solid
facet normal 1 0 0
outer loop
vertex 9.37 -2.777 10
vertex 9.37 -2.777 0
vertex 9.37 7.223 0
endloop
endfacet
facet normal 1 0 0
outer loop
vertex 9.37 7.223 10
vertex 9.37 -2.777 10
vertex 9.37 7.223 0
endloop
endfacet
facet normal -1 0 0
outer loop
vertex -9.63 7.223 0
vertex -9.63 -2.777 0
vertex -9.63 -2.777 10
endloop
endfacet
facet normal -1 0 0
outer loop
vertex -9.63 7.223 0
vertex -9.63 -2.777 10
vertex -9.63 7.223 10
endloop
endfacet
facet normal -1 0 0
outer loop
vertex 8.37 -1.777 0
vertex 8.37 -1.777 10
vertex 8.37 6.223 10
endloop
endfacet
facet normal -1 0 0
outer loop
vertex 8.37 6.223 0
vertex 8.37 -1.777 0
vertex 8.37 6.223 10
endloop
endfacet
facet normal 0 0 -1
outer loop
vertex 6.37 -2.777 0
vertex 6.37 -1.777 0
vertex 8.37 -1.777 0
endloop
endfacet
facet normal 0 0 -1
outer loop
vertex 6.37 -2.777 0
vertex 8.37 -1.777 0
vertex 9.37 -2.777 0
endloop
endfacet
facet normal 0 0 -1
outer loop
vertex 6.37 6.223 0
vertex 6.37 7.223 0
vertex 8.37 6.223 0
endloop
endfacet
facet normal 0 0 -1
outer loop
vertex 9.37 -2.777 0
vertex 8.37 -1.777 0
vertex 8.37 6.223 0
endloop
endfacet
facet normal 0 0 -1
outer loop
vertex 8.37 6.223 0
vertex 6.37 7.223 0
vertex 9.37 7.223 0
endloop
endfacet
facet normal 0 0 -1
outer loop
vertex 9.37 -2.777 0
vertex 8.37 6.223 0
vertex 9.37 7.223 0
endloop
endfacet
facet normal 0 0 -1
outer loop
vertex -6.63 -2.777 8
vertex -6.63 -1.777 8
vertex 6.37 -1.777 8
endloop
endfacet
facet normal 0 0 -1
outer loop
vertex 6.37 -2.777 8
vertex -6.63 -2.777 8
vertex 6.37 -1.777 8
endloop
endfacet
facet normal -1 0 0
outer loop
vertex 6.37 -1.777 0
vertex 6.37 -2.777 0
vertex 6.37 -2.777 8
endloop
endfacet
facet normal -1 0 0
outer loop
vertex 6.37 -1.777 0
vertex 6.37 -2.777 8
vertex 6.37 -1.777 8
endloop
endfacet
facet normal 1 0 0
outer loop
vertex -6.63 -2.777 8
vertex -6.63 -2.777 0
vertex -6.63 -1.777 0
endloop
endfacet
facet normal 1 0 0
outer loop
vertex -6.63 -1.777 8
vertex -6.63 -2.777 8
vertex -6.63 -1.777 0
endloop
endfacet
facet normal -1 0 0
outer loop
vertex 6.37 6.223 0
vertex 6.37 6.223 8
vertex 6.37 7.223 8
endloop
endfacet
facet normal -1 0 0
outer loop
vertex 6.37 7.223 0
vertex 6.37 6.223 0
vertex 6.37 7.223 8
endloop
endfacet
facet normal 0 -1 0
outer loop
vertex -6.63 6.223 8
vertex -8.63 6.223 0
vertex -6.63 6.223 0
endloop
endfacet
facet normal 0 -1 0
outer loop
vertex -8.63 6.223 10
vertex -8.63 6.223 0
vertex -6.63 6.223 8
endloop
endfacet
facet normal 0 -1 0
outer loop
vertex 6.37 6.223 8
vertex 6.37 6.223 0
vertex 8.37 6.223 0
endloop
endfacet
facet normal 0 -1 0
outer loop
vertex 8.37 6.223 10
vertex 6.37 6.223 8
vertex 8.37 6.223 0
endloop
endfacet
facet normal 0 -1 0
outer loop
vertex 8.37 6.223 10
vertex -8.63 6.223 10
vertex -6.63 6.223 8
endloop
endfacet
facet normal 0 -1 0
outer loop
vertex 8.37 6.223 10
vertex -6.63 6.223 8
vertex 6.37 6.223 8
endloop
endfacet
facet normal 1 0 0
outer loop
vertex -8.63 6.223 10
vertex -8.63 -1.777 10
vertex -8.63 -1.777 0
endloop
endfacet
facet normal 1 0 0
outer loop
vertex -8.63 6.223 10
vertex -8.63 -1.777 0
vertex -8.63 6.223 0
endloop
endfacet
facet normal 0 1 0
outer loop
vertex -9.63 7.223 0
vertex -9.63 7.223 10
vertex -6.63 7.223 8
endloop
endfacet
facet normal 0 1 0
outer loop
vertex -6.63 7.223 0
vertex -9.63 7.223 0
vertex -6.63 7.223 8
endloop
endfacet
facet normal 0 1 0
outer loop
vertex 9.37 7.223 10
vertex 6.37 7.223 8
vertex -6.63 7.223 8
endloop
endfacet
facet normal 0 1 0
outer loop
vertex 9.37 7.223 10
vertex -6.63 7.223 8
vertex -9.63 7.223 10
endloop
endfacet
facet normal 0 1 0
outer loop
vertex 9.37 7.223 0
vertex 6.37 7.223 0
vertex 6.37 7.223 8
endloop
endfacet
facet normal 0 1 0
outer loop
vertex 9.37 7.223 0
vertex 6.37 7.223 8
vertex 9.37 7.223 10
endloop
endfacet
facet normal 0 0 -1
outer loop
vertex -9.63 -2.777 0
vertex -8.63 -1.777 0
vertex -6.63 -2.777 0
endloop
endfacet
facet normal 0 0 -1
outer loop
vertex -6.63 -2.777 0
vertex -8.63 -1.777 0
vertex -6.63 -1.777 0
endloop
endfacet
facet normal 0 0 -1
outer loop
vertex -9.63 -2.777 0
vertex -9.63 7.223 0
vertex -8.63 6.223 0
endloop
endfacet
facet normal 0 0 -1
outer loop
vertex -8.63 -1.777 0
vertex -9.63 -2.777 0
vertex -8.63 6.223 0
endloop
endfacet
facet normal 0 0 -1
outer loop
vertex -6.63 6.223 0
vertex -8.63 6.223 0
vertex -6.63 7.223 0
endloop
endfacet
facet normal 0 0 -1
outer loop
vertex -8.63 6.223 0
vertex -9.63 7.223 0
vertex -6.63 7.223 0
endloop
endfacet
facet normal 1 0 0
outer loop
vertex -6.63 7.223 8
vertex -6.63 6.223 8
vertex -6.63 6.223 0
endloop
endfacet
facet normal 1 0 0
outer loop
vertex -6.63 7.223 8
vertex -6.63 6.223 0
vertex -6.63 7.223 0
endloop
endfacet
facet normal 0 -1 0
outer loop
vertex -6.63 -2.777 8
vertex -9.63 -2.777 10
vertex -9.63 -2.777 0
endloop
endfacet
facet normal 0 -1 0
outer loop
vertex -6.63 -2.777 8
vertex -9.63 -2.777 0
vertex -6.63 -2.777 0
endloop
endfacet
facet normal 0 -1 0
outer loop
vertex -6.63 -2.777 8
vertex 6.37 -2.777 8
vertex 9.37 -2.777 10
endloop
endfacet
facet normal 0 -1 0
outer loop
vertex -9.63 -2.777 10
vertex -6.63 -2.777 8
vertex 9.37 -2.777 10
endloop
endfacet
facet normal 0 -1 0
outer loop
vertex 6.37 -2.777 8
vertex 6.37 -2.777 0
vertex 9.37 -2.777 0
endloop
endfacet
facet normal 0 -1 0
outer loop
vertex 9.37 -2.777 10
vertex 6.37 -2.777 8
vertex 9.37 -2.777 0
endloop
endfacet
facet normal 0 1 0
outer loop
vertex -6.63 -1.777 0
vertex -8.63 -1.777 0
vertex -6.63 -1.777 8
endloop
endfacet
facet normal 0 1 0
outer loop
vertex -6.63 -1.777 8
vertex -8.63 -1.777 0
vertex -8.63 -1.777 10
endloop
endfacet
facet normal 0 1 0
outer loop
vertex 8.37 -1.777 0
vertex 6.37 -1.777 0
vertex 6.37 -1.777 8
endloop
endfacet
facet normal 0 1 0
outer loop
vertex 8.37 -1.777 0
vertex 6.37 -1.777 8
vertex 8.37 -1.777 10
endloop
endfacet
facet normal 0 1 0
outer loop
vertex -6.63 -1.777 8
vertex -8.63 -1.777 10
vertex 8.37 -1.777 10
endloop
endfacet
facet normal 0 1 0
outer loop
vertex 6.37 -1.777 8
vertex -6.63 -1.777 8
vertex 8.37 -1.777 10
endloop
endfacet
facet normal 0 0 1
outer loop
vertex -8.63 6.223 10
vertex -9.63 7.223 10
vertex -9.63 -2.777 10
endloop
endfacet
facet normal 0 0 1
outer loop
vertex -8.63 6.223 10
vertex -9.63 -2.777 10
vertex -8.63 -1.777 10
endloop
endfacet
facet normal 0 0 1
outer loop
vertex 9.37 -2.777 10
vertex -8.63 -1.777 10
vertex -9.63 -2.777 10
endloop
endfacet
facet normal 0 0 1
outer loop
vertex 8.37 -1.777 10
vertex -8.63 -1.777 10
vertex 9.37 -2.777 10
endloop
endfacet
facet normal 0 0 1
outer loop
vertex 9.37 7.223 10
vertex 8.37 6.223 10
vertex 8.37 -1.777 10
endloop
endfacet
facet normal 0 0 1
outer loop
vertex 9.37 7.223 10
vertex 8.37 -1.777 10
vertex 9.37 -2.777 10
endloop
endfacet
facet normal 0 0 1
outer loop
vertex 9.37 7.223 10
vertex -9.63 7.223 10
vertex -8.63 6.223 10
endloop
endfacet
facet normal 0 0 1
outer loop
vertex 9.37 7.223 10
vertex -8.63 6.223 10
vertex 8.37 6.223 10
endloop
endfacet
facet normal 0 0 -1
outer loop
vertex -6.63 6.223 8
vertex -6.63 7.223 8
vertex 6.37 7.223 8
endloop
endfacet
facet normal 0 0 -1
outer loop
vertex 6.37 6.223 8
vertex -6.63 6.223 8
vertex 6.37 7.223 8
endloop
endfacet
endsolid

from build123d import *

# Parameters (mm, degrees)
SKETCH1_W           = 19
SKETCH1_H           = 10
BOSS_EXTRUDE1_DEPTH = 10
SKETCH2_W           = 17
SKETCH2_H           = 8
CUT_EXTRUDE1_DEPTH  = 12
SKETCH3_W           = 13
SKETCH3_H           = 10.51996768
CUT_EXTRUDE3_DEPTH  = 8


with BuildPart() as part:
    # Sketch1 → Boss-Extrude1 (new body)
    with BuildSketch(Plane.XY):
        with Locations((-0.130136986, 2.22260274)):
            Rectangle(SKETCH1_W, SKETCH1_H)
    extrude(amount=BOSS_EXTRUDE1_DEPTH)

    # Sketch2 → Cut-Extrude1 (cut)
    with BuildSketch(Plane.XY.offset(10)):
        with Locations((-0.130136986, 2.22260274)):
            Rectangle(SKETCH2_W, SKETCH2_H)
    extrude(amount=-CUT_EXTRUDE1_DEPTH, mode=Mode.SUBTRACT)

    # Sketch3 → Cut-Extrude3 (cut)
    with BuildSketch(Plane.XY):
        with Locations((-0.130136986, 2.34516547)):
            Rectangle(SKETCH3_W, SKETCH3_H)
    extrude(amount=CUT_EXTRUDE3_DEPTH, mode=Mode.SUBTRACT)


solid = part.part
